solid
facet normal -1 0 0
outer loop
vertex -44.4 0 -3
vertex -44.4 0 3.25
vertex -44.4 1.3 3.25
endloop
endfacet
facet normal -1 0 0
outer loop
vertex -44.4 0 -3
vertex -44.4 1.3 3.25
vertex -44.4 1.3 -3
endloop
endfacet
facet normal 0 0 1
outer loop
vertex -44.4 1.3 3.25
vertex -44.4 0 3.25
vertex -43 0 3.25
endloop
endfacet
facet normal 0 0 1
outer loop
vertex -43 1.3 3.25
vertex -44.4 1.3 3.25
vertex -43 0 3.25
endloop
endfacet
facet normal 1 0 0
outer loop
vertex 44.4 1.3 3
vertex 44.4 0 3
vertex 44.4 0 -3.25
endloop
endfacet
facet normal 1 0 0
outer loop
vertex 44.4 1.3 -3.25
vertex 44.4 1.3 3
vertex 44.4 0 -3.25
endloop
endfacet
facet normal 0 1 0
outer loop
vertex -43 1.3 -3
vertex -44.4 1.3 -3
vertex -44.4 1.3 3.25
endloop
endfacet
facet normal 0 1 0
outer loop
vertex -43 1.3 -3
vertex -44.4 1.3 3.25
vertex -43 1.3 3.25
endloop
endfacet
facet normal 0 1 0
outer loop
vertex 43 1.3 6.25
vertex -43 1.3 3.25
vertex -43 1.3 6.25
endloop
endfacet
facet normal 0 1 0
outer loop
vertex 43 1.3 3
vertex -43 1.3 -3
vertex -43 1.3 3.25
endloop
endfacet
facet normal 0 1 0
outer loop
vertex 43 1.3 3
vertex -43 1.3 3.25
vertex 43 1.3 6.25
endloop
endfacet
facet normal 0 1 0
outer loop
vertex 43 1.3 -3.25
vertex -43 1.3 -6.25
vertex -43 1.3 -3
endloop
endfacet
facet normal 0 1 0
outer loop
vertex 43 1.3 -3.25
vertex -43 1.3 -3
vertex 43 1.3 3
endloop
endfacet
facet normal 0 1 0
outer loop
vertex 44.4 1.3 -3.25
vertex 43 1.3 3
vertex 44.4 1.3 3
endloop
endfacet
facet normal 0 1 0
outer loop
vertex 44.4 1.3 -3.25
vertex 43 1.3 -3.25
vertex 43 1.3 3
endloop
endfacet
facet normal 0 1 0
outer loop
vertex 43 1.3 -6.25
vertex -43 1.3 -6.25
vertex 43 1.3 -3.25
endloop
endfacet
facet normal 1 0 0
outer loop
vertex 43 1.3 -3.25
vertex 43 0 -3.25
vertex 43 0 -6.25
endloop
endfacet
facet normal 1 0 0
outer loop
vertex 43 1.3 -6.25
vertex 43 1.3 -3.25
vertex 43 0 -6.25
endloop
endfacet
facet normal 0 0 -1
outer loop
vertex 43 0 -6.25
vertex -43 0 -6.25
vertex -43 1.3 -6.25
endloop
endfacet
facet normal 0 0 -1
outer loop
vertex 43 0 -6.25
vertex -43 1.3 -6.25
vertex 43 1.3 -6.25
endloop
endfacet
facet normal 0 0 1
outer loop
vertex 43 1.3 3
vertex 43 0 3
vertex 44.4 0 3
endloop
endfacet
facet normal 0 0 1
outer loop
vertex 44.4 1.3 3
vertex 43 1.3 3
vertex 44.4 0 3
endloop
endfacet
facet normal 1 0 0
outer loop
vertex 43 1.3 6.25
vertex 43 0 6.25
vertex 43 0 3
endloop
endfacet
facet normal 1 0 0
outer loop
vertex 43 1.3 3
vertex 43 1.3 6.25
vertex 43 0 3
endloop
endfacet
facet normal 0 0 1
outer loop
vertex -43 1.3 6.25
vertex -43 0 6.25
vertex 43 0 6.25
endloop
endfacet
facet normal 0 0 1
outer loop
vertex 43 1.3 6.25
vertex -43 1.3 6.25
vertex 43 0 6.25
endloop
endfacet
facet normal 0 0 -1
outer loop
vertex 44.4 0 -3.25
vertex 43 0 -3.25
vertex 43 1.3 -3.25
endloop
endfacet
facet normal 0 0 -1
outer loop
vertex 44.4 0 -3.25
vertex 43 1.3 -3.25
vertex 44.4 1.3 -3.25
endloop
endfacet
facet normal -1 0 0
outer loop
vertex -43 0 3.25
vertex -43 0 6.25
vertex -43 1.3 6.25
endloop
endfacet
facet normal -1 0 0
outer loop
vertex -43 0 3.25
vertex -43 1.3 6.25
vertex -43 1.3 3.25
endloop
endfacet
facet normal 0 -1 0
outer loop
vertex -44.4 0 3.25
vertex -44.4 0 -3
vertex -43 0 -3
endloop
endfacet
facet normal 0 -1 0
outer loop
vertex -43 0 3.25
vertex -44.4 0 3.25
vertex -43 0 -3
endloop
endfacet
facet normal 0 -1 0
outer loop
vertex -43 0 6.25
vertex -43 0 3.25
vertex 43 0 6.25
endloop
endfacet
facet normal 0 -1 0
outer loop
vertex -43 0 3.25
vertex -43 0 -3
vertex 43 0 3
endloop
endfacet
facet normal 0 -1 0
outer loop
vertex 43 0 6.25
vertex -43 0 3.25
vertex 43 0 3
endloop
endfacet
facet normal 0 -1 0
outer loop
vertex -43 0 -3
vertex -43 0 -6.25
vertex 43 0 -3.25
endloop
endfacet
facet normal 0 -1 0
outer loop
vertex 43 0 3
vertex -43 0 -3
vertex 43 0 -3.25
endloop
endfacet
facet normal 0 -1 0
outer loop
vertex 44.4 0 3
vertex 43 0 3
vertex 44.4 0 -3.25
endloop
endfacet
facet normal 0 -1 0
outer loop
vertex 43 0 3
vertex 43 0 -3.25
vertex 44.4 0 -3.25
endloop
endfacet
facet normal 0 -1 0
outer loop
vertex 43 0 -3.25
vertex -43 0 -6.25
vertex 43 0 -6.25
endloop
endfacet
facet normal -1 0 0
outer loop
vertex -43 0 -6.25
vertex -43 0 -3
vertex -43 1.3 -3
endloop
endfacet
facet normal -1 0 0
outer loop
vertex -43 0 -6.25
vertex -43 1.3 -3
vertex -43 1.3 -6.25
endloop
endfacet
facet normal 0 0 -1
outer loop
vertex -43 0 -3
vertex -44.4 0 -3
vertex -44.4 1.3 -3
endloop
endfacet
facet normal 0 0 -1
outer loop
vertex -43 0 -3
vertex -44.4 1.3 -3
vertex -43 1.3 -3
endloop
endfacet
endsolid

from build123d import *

# Parameters (mm, degrees)
SKETCH1_W           = 86
SKETCH1_H           = 12.5
BOSS_EXTRUDE1_DEPTH = 1.3
SKETCH2_W           = 1.4
SKETCH2_H           = 6.25
BOSS_EXTRUDE2_DEPTH = 1.3


with BuildPart() as part:
    # Sketch1 → Boss-Extrude1 (new body)
    with BuildSketch(Plane(origin=(0, 0, 0), x_dir=(1, 0, 0), z_dir=(0, 1, 0))):
        Rectangle(SKETCH1_W, SKETCH1_H)
    extrude(amount=BOSS_EXTRUDE1_DEPTH)

    # Sketch2 → Boss-Extrude2 (add)
    with BuildSketch(Plane(origin=(0, 0, 0), x_dir=(1, 0, 0), z_dir=(0, 1, 0))):
        with Locations((-43.7, -0.125)):
            Rectangle(SKETCH2_W, SKETCH2_H)
        with Locations((43.7, 0.125)):
            Rectangle(SKETCH2_W, SKETCH2_H)
    extrude(amount=BOSS_EXTRUDE2_DEPTH)


solid = part.part
